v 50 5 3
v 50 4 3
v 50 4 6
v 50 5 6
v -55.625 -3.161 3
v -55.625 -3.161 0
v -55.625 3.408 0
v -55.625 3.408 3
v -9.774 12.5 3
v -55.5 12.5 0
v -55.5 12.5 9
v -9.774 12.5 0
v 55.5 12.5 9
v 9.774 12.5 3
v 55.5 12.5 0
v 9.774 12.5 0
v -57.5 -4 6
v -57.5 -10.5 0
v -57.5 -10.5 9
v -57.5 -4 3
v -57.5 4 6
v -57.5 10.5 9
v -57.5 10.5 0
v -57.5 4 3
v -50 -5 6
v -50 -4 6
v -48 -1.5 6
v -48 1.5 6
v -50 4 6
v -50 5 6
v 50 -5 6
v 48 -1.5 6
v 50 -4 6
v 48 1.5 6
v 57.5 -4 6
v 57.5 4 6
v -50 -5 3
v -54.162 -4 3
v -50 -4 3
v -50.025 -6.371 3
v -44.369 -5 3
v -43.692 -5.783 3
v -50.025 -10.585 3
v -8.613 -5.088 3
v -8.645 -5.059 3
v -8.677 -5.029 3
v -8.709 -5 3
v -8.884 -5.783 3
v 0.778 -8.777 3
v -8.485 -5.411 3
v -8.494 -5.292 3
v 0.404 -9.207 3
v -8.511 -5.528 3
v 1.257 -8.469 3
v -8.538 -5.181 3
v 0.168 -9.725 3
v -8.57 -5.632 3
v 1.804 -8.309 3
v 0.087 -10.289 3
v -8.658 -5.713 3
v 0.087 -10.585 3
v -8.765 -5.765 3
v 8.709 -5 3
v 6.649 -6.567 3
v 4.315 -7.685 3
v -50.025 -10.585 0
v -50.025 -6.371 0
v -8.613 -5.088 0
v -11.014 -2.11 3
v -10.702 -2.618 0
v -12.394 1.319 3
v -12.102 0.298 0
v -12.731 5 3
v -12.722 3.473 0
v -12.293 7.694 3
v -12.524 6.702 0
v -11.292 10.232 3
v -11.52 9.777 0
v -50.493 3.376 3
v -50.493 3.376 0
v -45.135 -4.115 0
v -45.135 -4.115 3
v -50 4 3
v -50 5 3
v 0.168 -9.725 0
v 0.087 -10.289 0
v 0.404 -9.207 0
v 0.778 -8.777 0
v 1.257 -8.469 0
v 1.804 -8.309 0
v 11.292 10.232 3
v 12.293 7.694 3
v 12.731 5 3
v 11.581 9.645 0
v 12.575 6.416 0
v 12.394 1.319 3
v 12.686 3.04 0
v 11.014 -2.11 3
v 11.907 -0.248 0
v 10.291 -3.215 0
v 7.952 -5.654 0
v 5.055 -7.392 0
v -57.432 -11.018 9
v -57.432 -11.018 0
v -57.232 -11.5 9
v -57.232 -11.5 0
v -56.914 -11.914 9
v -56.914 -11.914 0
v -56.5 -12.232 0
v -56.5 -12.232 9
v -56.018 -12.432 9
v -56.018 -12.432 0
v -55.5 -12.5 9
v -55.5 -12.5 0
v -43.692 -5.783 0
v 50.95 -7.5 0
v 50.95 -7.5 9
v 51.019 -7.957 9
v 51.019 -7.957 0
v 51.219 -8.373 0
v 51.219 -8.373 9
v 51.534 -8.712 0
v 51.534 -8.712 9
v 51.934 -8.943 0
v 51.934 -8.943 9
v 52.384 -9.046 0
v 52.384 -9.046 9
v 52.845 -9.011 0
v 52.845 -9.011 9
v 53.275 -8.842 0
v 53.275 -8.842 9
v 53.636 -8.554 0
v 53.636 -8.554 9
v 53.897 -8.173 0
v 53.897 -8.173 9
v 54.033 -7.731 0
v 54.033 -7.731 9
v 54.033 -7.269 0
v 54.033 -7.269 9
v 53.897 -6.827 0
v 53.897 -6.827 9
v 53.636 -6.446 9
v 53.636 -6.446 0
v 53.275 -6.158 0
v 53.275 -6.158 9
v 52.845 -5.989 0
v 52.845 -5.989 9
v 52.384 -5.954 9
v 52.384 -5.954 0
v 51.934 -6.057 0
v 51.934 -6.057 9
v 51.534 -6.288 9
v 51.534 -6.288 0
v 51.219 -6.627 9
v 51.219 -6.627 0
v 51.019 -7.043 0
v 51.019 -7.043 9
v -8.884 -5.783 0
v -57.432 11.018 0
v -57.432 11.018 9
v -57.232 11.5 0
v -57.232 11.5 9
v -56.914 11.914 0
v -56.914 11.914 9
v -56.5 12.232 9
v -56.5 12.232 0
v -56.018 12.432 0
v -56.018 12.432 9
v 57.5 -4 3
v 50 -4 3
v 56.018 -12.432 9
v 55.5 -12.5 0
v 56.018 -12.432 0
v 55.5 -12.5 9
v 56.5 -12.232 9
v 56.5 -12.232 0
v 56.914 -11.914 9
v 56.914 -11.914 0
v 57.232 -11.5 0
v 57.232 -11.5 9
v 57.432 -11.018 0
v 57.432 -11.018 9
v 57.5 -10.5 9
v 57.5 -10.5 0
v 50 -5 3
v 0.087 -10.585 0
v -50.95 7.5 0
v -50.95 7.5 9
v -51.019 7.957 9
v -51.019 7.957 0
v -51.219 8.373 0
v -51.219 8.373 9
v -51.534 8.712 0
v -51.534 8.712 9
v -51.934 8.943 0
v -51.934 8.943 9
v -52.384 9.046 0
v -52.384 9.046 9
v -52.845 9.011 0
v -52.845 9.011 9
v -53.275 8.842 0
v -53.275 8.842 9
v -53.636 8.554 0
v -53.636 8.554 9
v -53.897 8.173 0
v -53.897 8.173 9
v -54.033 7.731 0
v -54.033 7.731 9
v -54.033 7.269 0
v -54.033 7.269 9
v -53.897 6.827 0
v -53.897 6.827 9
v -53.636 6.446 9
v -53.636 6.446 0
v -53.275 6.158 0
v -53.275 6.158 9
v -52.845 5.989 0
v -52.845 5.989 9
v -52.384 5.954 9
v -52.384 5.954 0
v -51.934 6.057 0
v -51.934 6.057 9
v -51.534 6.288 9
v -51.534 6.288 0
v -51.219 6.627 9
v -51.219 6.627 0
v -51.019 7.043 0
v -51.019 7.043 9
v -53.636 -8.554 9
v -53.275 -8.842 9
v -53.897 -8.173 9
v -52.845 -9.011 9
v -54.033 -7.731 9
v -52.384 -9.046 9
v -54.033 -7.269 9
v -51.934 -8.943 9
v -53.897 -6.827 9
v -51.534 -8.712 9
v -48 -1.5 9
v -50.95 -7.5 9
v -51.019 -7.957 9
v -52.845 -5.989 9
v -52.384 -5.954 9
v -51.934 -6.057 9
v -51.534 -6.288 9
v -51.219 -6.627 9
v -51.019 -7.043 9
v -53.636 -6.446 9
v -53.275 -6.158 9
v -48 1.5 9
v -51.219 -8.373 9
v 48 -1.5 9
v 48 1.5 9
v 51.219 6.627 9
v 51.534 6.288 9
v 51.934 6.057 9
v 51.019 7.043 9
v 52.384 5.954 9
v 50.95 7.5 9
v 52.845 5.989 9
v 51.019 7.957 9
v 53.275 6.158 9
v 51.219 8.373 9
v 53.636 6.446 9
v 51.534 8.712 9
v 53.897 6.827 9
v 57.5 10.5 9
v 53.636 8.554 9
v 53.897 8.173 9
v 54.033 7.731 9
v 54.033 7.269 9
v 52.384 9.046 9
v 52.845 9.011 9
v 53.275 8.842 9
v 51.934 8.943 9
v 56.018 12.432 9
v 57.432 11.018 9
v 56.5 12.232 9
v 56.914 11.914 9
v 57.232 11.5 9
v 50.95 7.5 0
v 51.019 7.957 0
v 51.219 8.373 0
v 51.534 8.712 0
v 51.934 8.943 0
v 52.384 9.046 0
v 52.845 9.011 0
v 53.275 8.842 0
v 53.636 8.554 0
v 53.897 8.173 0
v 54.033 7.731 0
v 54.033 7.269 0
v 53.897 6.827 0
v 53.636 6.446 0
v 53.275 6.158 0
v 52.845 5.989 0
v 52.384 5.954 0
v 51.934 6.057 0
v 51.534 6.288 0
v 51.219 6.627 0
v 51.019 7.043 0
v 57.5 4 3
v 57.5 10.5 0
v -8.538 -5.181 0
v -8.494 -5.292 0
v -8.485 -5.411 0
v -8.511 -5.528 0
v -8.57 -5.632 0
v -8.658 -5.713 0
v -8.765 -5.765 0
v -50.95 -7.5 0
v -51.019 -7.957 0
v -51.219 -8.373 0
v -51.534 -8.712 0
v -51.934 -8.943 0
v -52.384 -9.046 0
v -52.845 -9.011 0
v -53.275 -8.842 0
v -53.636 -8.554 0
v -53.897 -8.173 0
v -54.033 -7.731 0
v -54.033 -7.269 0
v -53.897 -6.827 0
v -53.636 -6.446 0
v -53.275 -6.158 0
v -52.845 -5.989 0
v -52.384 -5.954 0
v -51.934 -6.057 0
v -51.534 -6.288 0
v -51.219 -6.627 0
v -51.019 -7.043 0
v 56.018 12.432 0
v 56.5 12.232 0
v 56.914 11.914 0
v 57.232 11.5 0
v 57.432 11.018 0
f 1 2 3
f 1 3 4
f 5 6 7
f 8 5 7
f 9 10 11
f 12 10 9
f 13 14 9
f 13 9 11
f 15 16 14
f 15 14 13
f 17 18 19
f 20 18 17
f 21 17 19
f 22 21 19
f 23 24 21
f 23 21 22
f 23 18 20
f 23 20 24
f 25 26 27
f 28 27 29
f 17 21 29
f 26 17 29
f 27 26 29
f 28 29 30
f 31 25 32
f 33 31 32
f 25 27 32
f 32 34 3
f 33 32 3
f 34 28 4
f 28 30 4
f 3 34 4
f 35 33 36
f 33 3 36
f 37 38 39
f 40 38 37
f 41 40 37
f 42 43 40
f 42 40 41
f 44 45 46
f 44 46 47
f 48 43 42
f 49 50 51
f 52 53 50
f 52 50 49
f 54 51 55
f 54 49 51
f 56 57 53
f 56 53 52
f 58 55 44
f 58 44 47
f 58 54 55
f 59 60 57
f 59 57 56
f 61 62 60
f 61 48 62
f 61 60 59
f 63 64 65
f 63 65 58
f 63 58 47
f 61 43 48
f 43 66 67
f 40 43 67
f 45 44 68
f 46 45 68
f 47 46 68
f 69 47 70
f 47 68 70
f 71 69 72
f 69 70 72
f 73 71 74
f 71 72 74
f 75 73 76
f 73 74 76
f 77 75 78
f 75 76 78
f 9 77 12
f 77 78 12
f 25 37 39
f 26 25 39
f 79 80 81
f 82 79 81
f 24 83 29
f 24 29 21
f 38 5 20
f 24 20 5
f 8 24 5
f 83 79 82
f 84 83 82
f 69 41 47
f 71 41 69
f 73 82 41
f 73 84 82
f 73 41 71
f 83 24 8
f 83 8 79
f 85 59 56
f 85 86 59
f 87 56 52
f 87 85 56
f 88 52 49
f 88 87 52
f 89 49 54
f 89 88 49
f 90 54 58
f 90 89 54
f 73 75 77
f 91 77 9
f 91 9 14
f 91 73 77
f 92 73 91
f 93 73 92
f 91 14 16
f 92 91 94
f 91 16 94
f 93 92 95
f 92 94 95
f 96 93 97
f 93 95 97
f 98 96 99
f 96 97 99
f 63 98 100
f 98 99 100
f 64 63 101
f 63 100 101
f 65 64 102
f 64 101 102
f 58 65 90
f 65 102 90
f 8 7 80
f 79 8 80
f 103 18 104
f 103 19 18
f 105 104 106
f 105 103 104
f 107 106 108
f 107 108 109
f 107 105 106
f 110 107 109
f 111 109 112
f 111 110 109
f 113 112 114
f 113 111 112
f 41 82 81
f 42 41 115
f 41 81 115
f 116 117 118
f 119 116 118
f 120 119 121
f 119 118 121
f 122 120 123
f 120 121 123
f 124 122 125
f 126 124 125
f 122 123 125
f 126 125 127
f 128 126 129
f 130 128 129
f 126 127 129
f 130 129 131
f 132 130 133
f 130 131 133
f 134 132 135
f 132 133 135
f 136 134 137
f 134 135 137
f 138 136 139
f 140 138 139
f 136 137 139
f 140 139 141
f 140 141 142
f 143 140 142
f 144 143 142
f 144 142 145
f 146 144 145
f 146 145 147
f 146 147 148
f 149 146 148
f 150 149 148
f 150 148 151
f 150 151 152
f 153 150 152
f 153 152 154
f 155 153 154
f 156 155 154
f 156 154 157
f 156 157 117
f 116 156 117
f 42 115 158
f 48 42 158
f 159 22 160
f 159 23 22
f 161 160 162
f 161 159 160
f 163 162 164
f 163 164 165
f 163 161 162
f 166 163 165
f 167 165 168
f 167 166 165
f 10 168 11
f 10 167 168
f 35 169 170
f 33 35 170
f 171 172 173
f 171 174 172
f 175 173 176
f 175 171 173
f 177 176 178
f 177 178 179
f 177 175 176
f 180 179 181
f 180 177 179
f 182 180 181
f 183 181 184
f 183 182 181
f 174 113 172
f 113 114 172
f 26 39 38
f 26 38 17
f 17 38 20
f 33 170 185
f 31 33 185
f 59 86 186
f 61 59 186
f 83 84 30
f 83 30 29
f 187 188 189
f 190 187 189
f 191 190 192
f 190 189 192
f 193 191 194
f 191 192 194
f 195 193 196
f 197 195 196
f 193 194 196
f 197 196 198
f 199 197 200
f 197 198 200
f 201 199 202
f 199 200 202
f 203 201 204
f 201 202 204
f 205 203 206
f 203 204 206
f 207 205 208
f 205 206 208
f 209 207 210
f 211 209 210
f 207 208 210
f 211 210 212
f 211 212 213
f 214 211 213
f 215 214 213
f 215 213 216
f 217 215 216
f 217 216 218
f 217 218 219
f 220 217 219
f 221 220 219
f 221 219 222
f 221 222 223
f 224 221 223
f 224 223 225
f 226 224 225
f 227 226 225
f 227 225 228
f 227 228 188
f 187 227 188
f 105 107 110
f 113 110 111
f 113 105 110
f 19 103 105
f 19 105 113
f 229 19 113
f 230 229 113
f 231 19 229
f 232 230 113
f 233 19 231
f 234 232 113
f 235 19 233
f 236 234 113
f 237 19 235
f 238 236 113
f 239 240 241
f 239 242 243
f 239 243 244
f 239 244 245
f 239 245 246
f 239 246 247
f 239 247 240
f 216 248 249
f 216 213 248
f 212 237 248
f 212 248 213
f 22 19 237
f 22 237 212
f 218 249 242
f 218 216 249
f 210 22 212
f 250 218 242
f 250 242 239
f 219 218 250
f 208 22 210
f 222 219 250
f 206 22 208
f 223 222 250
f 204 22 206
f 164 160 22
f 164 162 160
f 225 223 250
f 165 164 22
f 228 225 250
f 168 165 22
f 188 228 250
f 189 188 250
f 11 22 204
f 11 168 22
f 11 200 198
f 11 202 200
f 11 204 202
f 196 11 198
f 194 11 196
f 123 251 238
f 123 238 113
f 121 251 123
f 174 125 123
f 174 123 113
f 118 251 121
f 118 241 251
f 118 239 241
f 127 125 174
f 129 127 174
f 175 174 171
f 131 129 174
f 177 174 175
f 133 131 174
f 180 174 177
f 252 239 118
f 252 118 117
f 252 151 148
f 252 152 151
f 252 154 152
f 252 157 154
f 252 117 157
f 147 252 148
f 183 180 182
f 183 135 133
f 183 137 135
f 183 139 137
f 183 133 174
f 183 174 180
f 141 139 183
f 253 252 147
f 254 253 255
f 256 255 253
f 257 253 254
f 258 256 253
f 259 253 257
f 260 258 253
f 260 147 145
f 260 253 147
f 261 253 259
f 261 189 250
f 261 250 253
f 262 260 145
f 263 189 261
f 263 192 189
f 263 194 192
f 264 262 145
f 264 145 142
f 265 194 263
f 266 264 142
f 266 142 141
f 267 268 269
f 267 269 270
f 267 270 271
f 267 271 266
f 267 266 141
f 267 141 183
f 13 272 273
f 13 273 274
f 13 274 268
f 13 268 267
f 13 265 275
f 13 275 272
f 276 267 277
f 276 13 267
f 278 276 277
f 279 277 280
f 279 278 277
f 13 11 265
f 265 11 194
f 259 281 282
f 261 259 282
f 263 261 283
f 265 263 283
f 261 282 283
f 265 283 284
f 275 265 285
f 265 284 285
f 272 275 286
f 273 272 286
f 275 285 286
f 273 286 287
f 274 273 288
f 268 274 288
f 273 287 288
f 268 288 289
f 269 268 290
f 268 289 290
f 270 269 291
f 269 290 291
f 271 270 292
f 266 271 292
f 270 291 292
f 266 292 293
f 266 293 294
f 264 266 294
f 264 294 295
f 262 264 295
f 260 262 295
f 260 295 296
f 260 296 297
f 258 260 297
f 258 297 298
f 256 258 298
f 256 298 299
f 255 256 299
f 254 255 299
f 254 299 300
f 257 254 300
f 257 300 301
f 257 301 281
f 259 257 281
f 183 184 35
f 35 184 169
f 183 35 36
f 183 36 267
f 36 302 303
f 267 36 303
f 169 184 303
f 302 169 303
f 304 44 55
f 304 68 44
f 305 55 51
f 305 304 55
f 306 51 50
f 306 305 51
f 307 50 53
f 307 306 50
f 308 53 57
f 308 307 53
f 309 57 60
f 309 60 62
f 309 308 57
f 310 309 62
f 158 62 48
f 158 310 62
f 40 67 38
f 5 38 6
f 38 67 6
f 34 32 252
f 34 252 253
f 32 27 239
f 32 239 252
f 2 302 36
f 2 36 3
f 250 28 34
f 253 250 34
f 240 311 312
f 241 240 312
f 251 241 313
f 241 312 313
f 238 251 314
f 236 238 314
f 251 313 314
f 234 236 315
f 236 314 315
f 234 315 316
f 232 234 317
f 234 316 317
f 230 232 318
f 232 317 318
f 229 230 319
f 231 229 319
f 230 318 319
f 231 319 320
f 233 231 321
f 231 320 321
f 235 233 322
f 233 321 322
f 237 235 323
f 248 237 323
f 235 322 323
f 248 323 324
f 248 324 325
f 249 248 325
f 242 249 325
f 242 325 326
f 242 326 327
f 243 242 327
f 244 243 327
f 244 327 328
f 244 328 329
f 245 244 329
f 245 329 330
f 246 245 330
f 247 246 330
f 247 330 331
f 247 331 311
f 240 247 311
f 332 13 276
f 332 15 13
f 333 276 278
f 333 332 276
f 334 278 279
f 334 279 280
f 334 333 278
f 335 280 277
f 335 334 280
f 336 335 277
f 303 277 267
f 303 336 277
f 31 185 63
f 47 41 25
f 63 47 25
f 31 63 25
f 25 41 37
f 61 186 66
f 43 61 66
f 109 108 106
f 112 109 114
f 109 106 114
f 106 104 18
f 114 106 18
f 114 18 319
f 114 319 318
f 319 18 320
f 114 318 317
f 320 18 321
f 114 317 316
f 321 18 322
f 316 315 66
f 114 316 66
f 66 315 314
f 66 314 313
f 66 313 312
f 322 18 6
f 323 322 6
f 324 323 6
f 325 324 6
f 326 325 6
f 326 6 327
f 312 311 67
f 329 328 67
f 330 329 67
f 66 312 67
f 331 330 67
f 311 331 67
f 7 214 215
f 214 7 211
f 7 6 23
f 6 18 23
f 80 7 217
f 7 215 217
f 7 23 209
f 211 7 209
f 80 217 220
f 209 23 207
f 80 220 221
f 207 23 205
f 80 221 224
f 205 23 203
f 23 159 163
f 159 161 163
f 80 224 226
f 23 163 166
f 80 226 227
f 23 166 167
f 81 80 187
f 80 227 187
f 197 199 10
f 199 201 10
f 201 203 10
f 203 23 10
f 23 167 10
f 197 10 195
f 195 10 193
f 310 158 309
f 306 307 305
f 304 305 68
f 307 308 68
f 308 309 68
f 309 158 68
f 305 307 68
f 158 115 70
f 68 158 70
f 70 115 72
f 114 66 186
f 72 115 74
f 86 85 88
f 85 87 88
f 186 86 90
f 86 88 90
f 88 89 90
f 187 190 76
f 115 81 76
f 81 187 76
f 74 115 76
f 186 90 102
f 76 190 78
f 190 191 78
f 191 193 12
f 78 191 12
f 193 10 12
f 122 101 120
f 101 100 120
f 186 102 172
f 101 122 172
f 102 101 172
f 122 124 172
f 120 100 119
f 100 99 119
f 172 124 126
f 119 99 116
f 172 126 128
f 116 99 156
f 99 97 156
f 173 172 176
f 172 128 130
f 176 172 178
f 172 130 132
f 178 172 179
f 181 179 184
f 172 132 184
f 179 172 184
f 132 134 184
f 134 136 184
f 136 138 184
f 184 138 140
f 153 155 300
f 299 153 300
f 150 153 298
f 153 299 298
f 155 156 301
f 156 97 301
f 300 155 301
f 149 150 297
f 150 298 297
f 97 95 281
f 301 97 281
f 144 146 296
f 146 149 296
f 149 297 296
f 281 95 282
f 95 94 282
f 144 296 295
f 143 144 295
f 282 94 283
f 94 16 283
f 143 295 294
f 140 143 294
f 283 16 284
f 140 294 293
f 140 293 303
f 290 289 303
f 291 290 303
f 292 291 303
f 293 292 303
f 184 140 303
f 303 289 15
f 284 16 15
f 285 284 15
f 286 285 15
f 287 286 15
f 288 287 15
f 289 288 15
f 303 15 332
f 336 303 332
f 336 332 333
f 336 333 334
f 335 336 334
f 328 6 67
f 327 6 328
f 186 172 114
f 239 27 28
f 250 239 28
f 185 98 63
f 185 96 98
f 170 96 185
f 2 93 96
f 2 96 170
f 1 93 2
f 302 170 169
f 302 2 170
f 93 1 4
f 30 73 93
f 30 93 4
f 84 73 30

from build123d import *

# Parameters (mm, degrees)
SKETCH_W              = 115
SKETCH_H              = 25
PAD_DEPTH             = 3
PAD001_DEPTH          = 3
SKETCH002_W           = 115
SKETCH002_H           = 25
SKETCH002_W_2         = 96
SKETCH002_H_2         = 3
PAD002_DEPTH          = 3
SKETCH003_R           = 1.55
POCKET_DEPTH          = 245.060315
POLARPATTERN_COUNT    = 2
POLARPATTERN001_COUNT = 2
POLARPATTERN002_COUNT = 2
FILLET_R              = 2
SKETCH004_R           = 12.75
POCKET001_DEPTH       = 3
POCKET002_DEPTH       = 3
FILLET001_R           = 0.4
FILLET002_R           = 2


with BuildPart() as part:
    # Sketch → Pad (new body)
    with BuildSketch(Plane.XY):
        Rectangle(SKETCH_W, SKETCH_H)
    extrude(amount=PAD_DEPTH)

    # Sketch001 (on Face6 of Pad) → Pad001 (join)
    with BuildSketch(Plane.XY.offset(3)):
        Polygon((-57.5, 12.5), (57.5, 12.5), (57.5, 4), (50, 4), (50, 5), (-50, 5), (-50, 4), (-57.5, 4), align=None)
        Polygon((-57.5, -12.5), (57.5, -12.5), (57.5, -4), (50, -4), (50, -5), (-50, -5), (-50, -4), (-57.5, -4), align=None)
    extrude(amount=PAD001_DEPTH)

    # Sketch002 (on Face12 of Pad001) → Pad002 (join)
    with BuildSketch(Plane.XY.offset(6)):
        Rectangle(SKETCH002_W, SKETCH002_H)
        Rectangle(SKETCH002_W_2, SKETCH002_H_2, mode=Mode.SUBTRACT)
    extrude(amount=PAD002_DEPTH)

    # Sketch003 (on Face26 of Pad002) → Pocket (cut, through all)
    with BuildSketch(Plane.XY.offset(9)):
        with Locations((-52.5, 7.5)):
            Circle(SKETCH003_R)
    pocket = extrude(amount=-POCKET_DEPTH, mode=Mode.SUBTRACT)

    # PolarPattern: Pocket ×2 about axis
    polarpattern_axis = Axis((0, 0, 0), (0, 1, 0))
    for i in range(1, POLARPATTERN_COUNT):
        add(pocket.rotate(polarpattern_axis, i * 360 / POLARPATTERN_COUNT), mode=Mode.SUBTRACT)

    # PolarPattern001: Pocket ×2 about axis
    polarpattern001_axis = Axis((0, 0, 0), (1, 0, 0))
    for i in range(1, POLARPATTERN001_COUNT):
        add(pocket.rotate(polarpattern001_axis, i * 360 / POLARPATTERN001_COUNT), mode=Mode.SUBTRACT)

    # PolarPattern002: Pocket ×2 about axis
    polarpattern002_axis = Axis((0, 0, 9), (0, 0, 1))
    for i in range(1, POLARPATTERN002_COUNT):
        add(pocket.rotate(polarpattern002_axis, i * 360 / POLARPATTERN002_COUNT), mode=Mode.SUBTRACT)

    # Fillet
    fillet_edges = [part.edges().sort_by_distance(p)[0] for p in [
        (57.5, 12.5, 7.5),
        (57.5, 12.5, 4.5),
        (57.5, 12.5, 1.5),
        (57.5, -12.5, 7.5),
        (-57.5, 12.5, 7.5),
        (-57.5, -12.5, 7.5),
    ]]
    fillet(fillet_edges, radius=FILLET_R)

    # Sketch004 (on Face2 of Fillet) → Pocket001 (cut)
    with BuildSketch(Plane(origin=(0, 0, 0), x_dir=(1, 0, 0), z_dir=(0, 0, -1))):
        with Locations((0, -4.31247)):
            Circle(SKETCH004_R)
    extrude(amount=-POCKET001_DEPTH, mode=Mode.SUBTRACT)

    # Sketch005 (on Face2 of Pocket001) → Pocket002 (cut)
    with BuildSketch(Plane(origin=(0, 0, 0), x_dir=(1, 0, 0), z_dir=(0, 0, -1))):
        Polygon((0.086598, 10.584693), (-50.025204, 10.584693), (-50.025204, 6.371434), (-55.624748, 3.161258), (-55.624748, -3.408425), (-50.493088, -3.376352), (-45.134857, 4.115264), (-43.691578, 5.783052), (0.086598, 5.783052), align=None)
    extrude(amount=-POCKET002_DEPTH, mode=Mode.SUBTRACT)

    # Fillet001
    fillet001_edges = [part.edges().sort_by_distance(p)[0] for p in [
        (-7.787357, -5.783052, 1.5),
    ]]
    fillet(fillet001_edges, radius=FILLET001_R)

    # Fillet002
    fillet002_edges = [part.edges().sort_by_distance(p)[0] for p in [
        (0.086598, -8.437236, 1.5),
    ]]
    fillet(fillet002_edges, radius=FILLET002_R)


solid = part.part
